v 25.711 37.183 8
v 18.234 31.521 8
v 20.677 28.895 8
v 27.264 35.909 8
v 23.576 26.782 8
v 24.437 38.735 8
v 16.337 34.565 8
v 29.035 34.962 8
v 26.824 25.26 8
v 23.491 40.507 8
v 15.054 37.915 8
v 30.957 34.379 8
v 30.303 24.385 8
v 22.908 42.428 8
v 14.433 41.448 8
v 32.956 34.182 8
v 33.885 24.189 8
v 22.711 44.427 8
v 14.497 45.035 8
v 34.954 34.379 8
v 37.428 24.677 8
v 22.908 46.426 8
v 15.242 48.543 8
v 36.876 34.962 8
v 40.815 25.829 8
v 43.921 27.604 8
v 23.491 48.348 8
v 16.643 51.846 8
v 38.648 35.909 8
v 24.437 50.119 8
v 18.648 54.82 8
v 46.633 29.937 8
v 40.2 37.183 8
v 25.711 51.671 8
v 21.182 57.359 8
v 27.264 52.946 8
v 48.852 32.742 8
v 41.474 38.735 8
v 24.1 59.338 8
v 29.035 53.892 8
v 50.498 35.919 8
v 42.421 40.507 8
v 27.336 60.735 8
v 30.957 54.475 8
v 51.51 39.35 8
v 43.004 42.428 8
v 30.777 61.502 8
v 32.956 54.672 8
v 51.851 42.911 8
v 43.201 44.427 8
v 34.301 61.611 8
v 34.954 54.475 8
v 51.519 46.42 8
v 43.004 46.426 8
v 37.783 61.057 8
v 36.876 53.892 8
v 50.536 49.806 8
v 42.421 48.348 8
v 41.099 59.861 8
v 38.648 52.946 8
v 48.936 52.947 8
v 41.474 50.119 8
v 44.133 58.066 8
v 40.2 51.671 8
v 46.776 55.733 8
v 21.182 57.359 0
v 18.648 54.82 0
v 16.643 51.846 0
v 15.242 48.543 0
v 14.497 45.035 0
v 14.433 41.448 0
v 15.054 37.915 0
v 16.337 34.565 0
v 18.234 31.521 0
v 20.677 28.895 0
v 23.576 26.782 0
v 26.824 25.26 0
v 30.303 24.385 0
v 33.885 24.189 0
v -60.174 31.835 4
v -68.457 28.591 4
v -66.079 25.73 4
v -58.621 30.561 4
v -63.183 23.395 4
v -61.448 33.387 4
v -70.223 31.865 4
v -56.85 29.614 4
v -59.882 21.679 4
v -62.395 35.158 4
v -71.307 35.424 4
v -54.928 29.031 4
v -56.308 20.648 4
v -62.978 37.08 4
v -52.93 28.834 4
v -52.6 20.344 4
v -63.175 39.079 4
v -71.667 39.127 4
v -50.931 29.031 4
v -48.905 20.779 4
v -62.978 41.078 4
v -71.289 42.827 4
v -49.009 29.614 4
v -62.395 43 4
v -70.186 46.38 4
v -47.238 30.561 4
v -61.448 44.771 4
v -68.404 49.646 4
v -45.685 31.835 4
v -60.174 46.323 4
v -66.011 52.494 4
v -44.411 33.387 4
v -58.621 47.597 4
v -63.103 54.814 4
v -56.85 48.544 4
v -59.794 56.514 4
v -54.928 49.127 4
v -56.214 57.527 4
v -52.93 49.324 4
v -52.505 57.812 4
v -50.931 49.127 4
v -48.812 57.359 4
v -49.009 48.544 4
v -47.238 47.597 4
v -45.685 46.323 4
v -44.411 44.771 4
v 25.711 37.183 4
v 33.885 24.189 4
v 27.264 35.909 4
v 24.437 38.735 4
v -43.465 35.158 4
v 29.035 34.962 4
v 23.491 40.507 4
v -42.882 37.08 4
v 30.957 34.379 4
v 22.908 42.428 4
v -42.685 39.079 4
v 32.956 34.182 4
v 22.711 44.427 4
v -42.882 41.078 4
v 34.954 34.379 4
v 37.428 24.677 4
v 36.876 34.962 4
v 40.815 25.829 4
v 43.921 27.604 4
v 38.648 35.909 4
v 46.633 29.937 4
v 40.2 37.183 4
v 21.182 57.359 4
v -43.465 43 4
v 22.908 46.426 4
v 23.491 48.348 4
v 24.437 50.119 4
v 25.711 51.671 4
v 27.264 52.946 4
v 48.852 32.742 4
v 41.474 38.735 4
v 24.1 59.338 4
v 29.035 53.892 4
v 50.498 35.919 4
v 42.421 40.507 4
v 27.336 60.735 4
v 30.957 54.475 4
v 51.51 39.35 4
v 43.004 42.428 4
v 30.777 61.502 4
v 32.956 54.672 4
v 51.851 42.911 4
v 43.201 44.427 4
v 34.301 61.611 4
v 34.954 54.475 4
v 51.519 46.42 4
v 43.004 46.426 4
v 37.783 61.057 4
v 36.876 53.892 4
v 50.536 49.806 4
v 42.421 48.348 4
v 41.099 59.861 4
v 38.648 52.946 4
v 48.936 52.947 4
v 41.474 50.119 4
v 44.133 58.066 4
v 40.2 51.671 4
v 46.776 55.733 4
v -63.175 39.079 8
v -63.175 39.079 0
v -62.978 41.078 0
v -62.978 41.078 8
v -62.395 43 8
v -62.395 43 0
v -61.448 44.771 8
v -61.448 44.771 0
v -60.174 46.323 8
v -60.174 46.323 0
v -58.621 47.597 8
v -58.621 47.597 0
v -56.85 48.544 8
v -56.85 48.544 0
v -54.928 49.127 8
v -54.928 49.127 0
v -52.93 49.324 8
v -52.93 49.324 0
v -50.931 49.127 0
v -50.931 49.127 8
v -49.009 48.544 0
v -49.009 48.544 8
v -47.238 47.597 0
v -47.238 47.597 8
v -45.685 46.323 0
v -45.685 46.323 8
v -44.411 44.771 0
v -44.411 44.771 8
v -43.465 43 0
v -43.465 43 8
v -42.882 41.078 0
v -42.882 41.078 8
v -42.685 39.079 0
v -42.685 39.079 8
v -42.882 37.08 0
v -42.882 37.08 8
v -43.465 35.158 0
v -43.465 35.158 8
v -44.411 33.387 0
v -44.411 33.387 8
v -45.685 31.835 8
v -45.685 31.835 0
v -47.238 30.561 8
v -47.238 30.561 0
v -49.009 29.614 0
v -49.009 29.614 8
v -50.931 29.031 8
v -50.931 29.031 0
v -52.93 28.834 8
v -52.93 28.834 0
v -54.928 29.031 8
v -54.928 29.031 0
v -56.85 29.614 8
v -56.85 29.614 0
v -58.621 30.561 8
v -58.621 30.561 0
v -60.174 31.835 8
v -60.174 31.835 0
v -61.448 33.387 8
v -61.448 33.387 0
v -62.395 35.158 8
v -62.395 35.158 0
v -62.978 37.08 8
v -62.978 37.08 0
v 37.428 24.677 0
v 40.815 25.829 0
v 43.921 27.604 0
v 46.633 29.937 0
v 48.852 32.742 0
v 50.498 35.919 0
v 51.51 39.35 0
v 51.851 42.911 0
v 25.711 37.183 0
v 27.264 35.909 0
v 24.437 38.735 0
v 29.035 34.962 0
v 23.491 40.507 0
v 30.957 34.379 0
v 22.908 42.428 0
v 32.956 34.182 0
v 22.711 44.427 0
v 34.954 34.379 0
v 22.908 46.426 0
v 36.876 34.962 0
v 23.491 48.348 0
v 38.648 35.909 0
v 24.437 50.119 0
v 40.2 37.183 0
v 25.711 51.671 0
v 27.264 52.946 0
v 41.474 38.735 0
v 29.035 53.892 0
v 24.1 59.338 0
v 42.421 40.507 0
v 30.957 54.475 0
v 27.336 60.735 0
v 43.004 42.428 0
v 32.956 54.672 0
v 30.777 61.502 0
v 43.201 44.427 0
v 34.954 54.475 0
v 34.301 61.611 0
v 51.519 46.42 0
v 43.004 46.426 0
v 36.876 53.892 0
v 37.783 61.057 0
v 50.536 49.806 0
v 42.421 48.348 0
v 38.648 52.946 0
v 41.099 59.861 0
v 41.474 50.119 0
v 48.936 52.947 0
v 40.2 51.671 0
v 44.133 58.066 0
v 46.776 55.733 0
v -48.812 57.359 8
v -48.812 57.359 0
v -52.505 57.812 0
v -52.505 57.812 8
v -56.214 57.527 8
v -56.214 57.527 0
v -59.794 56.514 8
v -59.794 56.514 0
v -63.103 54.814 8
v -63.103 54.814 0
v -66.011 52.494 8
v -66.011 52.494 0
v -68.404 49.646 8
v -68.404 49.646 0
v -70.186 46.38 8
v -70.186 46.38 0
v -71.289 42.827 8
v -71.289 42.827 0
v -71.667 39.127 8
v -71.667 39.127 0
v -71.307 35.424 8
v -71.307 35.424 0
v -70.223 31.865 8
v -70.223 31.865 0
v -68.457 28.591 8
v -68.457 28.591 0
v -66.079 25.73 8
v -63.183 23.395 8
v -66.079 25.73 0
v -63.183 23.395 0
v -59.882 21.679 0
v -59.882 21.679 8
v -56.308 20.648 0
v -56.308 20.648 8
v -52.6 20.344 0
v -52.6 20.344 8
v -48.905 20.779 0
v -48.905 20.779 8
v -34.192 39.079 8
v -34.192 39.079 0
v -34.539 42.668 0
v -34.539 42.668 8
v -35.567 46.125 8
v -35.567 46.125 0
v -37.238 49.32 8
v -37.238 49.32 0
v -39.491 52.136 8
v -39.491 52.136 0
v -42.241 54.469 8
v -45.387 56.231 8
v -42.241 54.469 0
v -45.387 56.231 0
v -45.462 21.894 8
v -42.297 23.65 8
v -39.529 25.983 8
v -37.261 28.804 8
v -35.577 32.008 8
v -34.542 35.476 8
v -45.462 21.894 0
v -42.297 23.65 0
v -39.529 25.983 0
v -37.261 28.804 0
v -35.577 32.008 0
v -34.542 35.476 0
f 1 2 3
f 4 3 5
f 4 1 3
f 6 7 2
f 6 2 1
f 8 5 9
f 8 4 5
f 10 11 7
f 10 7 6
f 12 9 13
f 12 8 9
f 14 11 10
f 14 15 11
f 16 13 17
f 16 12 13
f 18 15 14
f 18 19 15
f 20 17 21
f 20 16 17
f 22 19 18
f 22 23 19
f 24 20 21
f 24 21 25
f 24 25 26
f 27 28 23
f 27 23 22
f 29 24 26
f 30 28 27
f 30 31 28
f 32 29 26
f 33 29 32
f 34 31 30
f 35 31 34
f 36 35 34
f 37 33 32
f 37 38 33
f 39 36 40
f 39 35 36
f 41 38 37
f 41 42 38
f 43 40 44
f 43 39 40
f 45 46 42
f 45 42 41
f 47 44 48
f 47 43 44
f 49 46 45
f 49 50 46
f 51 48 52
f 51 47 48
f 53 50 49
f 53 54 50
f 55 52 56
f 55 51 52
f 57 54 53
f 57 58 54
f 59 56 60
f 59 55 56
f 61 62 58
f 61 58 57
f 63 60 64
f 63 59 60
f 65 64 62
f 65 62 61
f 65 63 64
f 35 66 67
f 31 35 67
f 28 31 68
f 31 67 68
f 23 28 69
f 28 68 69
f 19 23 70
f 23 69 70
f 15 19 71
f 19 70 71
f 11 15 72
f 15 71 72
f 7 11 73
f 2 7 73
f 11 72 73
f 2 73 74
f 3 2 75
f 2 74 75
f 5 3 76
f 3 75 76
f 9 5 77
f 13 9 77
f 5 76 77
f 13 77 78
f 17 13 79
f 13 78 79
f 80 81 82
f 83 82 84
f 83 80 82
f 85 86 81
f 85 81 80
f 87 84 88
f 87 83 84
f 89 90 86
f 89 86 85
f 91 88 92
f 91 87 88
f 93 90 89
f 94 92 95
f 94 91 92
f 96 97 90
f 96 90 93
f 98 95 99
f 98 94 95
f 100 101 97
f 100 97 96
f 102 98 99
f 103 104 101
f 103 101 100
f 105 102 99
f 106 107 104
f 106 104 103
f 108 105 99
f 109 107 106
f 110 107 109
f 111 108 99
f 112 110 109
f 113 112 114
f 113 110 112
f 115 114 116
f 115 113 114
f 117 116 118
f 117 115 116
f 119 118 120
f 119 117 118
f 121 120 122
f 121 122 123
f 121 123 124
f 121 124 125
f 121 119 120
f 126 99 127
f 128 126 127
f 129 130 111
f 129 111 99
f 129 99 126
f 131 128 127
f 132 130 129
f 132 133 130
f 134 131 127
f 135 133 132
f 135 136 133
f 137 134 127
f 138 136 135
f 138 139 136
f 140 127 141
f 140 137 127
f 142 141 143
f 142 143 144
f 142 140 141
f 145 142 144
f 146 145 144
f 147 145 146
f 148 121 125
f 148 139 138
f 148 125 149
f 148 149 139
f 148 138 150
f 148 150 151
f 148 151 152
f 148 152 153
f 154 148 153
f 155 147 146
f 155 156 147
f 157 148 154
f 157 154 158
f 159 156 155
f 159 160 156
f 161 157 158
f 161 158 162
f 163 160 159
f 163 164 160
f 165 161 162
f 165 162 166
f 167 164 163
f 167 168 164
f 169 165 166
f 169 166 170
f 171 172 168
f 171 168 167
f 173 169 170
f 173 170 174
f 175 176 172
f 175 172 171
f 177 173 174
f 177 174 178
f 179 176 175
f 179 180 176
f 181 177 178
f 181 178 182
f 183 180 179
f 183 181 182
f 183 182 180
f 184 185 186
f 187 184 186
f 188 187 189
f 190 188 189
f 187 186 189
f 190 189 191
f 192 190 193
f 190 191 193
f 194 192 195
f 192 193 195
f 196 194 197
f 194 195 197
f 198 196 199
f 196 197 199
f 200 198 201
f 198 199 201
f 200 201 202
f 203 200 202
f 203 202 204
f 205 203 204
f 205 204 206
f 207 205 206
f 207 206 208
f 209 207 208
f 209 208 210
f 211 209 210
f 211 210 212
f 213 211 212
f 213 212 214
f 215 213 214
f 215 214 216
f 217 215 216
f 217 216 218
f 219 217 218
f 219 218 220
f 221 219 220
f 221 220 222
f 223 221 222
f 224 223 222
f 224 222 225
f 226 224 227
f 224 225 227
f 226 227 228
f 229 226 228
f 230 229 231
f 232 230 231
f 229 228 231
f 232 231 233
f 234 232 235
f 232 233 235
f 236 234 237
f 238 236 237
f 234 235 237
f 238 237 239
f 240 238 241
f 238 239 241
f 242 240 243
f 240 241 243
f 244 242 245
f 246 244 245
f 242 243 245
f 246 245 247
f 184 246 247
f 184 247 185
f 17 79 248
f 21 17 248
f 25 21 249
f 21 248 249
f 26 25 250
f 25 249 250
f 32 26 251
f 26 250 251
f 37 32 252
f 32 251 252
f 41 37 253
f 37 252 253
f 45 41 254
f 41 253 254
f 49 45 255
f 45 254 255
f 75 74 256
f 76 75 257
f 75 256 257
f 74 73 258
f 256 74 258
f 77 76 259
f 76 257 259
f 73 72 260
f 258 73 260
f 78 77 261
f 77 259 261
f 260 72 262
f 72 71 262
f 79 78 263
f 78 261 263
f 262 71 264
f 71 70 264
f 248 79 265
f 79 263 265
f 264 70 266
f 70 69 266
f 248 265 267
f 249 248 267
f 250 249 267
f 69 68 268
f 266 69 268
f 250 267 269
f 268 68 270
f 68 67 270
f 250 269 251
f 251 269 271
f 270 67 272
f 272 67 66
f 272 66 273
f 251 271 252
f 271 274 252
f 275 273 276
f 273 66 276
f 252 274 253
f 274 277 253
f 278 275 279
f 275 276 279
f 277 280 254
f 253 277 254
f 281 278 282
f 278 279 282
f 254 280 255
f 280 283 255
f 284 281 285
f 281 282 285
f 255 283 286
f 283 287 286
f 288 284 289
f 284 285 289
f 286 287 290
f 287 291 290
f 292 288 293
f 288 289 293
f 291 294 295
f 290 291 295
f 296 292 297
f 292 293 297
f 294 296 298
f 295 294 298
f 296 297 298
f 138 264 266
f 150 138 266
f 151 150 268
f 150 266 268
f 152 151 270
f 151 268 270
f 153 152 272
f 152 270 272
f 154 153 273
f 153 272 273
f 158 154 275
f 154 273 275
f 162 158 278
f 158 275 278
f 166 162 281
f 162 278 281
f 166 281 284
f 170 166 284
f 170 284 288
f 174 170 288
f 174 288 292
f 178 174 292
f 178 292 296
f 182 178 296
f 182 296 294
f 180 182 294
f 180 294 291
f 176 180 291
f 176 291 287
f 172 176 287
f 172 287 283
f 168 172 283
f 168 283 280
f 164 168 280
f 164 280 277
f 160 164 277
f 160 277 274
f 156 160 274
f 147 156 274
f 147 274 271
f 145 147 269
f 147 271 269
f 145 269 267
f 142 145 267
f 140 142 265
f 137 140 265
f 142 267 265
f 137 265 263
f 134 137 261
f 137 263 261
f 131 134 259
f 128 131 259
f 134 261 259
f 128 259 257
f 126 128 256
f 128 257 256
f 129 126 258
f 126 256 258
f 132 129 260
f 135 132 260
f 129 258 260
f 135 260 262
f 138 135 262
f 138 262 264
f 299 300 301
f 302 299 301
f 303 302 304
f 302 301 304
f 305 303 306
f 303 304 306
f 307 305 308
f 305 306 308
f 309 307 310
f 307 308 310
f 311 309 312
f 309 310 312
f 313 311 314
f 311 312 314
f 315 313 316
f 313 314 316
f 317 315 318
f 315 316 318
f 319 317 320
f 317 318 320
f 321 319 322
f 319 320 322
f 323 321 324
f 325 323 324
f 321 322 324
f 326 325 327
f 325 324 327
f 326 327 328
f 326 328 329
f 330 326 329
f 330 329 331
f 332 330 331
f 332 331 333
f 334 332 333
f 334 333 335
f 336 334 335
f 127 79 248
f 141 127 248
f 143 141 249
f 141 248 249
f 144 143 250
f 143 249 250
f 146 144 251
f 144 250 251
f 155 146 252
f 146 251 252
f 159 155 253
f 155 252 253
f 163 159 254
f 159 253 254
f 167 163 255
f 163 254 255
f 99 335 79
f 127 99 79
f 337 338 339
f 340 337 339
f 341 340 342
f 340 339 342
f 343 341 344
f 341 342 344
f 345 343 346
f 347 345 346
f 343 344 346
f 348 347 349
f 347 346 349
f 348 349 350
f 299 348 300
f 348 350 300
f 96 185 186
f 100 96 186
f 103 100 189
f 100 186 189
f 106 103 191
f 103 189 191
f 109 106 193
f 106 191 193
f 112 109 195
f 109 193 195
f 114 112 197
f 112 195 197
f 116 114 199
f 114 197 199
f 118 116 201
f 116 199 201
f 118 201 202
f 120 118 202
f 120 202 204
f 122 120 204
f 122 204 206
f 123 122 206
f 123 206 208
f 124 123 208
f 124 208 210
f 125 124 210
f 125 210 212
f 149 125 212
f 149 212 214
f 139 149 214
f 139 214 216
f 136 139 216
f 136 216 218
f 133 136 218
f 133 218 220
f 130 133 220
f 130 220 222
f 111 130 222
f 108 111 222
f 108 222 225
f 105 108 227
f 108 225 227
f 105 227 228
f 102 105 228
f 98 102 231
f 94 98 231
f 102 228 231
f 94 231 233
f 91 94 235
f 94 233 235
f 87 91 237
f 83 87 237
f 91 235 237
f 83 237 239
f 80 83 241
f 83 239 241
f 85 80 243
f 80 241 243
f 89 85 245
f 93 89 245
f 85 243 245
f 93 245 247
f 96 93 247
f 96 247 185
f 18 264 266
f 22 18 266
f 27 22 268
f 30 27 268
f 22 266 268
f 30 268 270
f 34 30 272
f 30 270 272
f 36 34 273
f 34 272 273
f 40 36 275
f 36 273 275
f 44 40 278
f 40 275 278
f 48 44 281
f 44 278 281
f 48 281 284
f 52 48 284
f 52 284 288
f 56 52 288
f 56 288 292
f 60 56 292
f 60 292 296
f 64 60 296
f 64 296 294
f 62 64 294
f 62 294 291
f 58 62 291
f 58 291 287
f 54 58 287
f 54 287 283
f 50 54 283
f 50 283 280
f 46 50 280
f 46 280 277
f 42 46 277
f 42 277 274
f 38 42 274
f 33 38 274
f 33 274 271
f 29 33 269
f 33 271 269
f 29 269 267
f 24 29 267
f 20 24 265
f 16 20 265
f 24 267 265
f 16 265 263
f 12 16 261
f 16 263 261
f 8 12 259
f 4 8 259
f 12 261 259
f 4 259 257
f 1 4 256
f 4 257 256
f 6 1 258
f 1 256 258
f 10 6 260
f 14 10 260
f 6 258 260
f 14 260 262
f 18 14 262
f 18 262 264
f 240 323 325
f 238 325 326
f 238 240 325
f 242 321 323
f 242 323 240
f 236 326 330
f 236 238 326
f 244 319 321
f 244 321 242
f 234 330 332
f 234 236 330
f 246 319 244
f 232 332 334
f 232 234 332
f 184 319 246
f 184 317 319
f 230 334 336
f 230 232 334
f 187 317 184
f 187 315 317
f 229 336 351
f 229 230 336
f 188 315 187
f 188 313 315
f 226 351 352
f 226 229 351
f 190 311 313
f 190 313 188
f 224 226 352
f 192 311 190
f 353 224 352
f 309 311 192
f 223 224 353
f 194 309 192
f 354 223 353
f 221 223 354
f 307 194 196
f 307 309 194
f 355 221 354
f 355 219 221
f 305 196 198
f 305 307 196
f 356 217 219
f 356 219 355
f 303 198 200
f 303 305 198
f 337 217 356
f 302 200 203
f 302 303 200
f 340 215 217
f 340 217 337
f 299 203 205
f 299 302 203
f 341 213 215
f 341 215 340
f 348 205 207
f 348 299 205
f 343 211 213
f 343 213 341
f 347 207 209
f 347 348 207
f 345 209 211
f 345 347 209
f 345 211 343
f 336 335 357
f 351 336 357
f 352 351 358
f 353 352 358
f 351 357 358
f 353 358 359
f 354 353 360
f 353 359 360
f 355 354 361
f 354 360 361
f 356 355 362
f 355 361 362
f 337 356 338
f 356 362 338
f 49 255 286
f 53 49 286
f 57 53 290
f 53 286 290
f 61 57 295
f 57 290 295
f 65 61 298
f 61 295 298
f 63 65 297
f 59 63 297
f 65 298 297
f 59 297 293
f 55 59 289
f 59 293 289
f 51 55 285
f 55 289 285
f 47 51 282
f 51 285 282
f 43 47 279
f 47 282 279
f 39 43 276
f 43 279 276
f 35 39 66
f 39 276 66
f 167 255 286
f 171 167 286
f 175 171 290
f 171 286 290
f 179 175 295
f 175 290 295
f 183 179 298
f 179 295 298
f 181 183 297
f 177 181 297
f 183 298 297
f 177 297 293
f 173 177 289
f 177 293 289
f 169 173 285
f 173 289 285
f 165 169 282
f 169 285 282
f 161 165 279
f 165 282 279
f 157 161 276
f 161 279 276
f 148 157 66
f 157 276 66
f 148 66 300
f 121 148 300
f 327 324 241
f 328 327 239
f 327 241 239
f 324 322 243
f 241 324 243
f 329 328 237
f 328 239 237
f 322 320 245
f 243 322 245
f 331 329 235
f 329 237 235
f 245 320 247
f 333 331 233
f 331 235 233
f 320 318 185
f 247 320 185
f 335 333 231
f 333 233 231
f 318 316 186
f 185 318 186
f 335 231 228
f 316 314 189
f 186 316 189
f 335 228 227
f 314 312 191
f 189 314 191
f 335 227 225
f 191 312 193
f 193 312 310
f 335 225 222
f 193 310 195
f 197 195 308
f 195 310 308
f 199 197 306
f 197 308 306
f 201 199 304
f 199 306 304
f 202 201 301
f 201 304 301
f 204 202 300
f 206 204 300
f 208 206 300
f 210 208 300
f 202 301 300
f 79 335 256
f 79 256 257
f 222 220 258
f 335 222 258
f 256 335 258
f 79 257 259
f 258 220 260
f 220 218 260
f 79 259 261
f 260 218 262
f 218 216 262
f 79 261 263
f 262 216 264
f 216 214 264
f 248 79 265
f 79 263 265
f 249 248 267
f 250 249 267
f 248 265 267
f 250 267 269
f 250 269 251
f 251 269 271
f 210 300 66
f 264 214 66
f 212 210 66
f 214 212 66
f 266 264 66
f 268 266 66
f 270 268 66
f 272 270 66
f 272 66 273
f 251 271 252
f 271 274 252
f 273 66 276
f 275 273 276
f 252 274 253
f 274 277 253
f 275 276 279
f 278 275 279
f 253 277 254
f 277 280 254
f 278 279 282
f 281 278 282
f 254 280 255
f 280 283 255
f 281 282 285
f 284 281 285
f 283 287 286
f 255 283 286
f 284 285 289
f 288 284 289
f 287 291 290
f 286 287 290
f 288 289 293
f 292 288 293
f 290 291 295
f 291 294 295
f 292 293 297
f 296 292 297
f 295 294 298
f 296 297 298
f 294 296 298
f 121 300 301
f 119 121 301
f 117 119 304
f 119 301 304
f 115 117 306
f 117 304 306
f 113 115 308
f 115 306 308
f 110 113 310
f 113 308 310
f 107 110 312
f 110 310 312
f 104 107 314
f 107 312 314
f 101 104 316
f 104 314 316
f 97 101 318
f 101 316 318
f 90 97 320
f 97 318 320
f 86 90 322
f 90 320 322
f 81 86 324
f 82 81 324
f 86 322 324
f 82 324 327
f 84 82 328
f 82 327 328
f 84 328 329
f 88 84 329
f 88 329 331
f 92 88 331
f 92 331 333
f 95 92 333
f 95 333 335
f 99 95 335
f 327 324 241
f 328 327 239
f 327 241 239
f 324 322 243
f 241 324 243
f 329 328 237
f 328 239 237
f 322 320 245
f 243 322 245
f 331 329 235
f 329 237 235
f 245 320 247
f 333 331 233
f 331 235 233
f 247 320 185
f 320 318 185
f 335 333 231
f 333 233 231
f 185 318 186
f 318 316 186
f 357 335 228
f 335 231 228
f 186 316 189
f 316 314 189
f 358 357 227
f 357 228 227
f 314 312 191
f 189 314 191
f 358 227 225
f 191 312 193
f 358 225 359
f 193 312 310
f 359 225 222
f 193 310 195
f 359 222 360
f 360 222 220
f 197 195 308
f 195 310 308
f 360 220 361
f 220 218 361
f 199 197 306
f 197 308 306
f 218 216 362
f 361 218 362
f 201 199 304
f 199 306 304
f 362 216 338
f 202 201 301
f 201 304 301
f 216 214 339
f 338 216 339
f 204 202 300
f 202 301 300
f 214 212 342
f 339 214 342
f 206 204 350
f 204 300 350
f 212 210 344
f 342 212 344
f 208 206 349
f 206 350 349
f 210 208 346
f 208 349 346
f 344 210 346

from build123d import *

# Parameters (mm, degrees)
F1_DEPTH   = 8
F2_DEPTH   = 4
F4_D       = 20.49
F4_DEPTH   = 12
F4_2_D     = 20.49
F4_2_DEPTH = 12


with BuildPart() as f1:
    # F0 (on Top) → F1 (new body)
    with BuildSketch(Plane.XY):
        with BuildLine():
            ThreePointArc((-48.905286, 20.778554), (-38.326452, 27.33815), (-34.191997, 39.078948))
            ThreePointArc((-34.191997, 39.078948), (-38.29669, 50.782631), (-48.812414, 57.358671))
            ThreePointArc((-48.812414, 57.358671), (-71.667261, 39.12652), (-48.905286, 20.778554))
        make_face()
        with BuildLine():
            ThreePointArc((51.851126, 42.910588), (41.099003, 59.861433), (21.18229, 57.358671))
            ThreePointArc((21.18229, 57.358671), (15.614995, 36.209575), (33.884644, 24.188803))
            ThreePointArc((33.884644, 24.188803), (46.632896, 29.936578), (51.851126, 42.910588))
        make_face()
    extrude(amount=F1_DEPTH)

    # F4
    with Locations(Plane.XY.offset(8)):
        with Locations((-52.929659, 39.078948), (32.955691, 44.427127)):
            Hole(F4_D / 2, depth=F4_DEPTH)


with BuildPart() as f2:
    # F0 (on Top) → F2 (new body)
    with BuildSketch(Plane.XY):
        with BuildLine():
            ThreePointArc((-48.905286, 20.778554), (-38.326452, 27.33815), (-34.191997, 39.078948))
            ThreePointArc((-34.191997, 39.078948), (-38.29669, 50.782631), (-48.812414, 57.358671))
            ThreePointArc((-48.812414, 57.358671), (-71.667261, 39.12652), (-48.905286, 20.778554))
        make_face()
        with BuildLine():
            ThreePointArc((-48.812414, 57.358671), (-38.29669, 50.782631), (-34.191997, 39.078948))
            ThreePointArc((-34.191997, 39.078948), (-38.326452, 27.33815), (-48.905286, 20.778554))
            Line((-48.905286, 20.778554), (33.884644, 24.188803))
            ThreePointArc((33.884644, 24.188803), (15.614995, 36.209575), (21.18229, 57.358671))
            Line((21.18229, 57.358671), (-48.812414, 57.358671))
        make_face()
        with BuildLine():
            ThreePointArc((51.851126, 42.910588), (41.099003, 59.861433), (21.18229, 57.358671))
            ThreePointArc((21.18229, 57.358671), (15.614995, 36.209575), (33.884644, 24.188803))
            ThreePointArc((33.884644, 24.188803), (46.632896, 29.936578), (51.851126, 42.910588))
        make_face()
    extrude(amount=F2_DEPTH)

    # F4#2
    with Locations(Plane.XY.offset(8)):
        with Locations((-52.929659, 39.078948), (32.955691, 44.427127)):
            Hole(F4_2_D / 2, depth=F4_2_DEPTH)


solid = Compound([f1.part, f2.part])
